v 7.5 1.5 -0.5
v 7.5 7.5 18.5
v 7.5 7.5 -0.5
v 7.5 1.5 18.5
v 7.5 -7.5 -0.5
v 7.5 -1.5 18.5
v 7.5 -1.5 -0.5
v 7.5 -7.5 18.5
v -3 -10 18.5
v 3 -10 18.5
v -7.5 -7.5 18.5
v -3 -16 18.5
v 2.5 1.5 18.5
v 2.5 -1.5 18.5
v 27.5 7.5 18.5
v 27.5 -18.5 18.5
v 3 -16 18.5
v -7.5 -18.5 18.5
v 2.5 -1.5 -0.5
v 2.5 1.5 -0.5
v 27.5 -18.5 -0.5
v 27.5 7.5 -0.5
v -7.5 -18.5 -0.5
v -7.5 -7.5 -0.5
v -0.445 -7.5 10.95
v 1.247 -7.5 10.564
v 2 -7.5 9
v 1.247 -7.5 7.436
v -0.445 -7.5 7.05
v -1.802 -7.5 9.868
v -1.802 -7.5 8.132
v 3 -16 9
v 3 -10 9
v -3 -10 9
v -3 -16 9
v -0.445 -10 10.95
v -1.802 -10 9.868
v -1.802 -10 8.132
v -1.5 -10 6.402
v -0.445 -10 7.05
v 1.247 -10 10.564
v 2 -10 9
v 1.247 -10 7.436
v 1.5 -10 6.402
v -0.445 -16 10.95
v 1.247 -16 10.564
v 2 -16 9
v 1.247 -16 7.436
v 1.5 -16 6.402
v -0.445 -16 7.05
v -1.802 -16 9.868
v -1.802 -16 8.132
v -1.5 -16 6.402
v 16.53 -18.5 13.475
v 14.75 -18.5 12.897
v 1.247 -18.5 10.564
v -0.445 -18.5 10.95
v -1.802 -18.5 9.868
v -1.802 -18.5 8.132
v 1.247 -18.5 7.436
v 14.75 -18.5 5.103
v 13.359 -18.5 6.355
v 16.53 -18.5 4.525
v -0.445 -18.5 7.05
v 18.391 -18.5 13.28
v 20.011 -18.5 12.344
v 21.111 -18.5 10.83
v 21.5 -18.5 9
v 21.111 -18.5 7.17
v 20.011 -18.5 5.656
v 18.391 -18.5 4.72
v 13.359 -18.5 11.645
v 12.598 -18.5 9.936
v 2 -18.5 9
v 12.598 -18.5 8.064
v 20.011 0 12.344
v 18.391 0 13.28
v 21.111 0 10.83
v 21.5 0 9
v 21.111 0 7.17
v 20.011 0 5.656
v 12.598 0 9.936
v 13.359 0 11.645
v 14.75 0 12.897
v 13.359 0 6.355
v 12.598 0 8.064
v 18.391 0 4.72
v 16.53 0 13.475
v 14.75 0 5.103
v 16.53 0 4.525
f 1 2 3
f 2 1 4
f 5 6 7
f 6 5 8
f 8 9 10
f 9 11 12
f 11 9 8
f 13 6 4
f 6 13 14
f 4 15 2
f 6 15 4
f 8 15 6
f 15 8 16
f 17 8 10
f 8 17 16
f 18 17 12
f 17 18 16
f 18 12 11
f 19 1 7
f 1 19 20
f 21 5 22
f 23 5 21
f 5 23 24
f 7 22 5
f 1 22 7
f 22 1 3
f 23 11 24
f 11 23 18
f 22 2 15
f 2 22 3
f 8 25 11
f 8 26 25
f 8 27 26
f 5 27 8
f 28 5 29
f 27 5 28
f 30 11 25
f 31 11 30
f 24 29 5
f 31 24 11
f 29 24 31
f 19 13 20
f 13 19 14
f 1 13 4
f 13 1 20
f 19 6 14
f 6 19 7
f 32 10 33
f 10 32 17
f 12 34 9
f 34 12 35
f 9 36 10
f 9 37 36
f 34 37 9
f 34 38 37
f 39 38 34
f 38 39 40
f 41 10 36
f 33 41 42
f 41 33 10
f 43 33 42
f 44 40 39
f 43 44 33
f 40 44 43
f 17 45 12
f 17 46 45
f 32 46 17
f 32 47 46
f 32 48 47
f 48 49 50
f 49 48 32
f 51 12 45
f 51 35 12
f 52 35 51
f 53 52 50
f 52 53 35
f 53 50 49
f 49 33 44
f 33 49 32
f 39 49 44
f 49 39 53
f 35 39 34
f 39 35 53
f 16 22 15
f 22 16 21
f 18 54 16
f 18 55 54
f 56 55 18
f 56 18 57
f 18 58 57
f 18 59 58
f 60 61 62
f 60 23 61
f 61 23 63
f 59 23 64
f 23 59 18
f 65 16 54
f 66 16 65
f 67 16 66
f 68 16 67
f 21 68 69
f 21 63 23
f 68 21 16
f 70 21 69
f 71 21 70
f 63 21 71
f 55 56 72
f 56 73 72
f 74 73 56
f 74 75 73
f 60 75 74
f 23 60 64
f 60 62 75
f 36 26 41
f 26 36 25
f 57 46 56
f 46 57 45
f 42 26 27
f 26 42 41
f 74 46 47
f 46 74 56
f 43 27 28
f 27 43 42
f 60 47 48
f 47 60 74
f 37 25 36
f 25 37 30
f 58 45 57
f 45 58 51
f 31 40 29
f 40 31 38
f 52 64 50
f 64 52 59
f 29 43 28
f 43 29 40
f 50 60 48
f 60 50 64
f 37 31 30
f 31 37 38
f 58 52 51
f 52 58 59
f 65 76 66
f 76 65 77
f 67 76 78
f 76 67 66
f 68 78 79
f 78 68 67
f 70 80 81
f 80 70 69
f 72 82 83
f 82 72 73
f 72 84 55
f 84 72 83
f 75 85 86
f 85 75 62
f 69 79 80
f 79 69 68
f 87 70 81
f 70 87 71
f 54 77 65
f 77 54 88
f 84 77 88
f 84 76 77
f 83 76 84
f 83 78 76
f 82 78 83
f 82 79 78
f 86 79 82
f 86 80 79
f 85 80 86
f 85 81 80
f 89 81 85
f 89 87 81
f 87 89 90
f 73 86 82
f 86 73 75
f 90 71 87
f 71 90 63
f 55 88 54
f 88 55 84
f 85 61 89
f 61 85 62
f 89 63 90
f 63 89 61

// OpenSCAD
screw_d=3;
screw_n_d=6;
screw_n_t=3;
rod_d=8;
openrail_lw=15;

translate([0,0,(rod_d+10)/2])optics_rail();

module optics_rail(){
difference(){
translate([(openrail_lw+5)/2,-5.5,0])cube([(rod_d+11)+(openrail_lw+1),(screw_n_t+7)+(openrail_lw+1),rod_d+11],center = true);
openrail_model();
translate([0,((openrail_lw+1)/-2)-screw_n_t+1,0])rotate([0,0,00])nuttrap();
rotate([90,0,0])cylinder(100,(screw_d+1)/2,(screw_d+1)/2);
#translate([((openrail_lw+1)/2)+((rod_d+1)),0,0])rotate([90,0,0])cylinder(30,(rod_d+1)/2,(rod_d+1)/2);
}
}


module openrail_model(){
difference(){
cube([openrail_lw, openrail_lw, rod_d+11], center = true);
translate([5,0,0])cube([5,screw_d,rod_d+12], center = true);
}
}


module reg_polygon(sides,radius)
{
  function dia(r) = sqrt(pow(r*2,2)/2);  //sqrt((r*2^2)/2) if only we had an exponention op
  if(sides<2) square([radius,0]);
  if(sides==3) triangle(radius);
  if(sides==4) square([dia(radius),dia(radius)],center=true);
  if(sides>4) circle(r=radius,$fn=sides);
}

module hexagonf(radius)
{
  reg_polygon(6,radius);
}

module hexagon(height,radius) 
{
  linear_extrude(height=height) hexagonf(radius);
}
module nuttrap(){
translate([0, screw_n_t/-1,10])cube([screw_n_d,screw_n_t*2,20],center =true);
rotate([90,0,0])hexagon(screw_n_d,screw_n_t);
}
